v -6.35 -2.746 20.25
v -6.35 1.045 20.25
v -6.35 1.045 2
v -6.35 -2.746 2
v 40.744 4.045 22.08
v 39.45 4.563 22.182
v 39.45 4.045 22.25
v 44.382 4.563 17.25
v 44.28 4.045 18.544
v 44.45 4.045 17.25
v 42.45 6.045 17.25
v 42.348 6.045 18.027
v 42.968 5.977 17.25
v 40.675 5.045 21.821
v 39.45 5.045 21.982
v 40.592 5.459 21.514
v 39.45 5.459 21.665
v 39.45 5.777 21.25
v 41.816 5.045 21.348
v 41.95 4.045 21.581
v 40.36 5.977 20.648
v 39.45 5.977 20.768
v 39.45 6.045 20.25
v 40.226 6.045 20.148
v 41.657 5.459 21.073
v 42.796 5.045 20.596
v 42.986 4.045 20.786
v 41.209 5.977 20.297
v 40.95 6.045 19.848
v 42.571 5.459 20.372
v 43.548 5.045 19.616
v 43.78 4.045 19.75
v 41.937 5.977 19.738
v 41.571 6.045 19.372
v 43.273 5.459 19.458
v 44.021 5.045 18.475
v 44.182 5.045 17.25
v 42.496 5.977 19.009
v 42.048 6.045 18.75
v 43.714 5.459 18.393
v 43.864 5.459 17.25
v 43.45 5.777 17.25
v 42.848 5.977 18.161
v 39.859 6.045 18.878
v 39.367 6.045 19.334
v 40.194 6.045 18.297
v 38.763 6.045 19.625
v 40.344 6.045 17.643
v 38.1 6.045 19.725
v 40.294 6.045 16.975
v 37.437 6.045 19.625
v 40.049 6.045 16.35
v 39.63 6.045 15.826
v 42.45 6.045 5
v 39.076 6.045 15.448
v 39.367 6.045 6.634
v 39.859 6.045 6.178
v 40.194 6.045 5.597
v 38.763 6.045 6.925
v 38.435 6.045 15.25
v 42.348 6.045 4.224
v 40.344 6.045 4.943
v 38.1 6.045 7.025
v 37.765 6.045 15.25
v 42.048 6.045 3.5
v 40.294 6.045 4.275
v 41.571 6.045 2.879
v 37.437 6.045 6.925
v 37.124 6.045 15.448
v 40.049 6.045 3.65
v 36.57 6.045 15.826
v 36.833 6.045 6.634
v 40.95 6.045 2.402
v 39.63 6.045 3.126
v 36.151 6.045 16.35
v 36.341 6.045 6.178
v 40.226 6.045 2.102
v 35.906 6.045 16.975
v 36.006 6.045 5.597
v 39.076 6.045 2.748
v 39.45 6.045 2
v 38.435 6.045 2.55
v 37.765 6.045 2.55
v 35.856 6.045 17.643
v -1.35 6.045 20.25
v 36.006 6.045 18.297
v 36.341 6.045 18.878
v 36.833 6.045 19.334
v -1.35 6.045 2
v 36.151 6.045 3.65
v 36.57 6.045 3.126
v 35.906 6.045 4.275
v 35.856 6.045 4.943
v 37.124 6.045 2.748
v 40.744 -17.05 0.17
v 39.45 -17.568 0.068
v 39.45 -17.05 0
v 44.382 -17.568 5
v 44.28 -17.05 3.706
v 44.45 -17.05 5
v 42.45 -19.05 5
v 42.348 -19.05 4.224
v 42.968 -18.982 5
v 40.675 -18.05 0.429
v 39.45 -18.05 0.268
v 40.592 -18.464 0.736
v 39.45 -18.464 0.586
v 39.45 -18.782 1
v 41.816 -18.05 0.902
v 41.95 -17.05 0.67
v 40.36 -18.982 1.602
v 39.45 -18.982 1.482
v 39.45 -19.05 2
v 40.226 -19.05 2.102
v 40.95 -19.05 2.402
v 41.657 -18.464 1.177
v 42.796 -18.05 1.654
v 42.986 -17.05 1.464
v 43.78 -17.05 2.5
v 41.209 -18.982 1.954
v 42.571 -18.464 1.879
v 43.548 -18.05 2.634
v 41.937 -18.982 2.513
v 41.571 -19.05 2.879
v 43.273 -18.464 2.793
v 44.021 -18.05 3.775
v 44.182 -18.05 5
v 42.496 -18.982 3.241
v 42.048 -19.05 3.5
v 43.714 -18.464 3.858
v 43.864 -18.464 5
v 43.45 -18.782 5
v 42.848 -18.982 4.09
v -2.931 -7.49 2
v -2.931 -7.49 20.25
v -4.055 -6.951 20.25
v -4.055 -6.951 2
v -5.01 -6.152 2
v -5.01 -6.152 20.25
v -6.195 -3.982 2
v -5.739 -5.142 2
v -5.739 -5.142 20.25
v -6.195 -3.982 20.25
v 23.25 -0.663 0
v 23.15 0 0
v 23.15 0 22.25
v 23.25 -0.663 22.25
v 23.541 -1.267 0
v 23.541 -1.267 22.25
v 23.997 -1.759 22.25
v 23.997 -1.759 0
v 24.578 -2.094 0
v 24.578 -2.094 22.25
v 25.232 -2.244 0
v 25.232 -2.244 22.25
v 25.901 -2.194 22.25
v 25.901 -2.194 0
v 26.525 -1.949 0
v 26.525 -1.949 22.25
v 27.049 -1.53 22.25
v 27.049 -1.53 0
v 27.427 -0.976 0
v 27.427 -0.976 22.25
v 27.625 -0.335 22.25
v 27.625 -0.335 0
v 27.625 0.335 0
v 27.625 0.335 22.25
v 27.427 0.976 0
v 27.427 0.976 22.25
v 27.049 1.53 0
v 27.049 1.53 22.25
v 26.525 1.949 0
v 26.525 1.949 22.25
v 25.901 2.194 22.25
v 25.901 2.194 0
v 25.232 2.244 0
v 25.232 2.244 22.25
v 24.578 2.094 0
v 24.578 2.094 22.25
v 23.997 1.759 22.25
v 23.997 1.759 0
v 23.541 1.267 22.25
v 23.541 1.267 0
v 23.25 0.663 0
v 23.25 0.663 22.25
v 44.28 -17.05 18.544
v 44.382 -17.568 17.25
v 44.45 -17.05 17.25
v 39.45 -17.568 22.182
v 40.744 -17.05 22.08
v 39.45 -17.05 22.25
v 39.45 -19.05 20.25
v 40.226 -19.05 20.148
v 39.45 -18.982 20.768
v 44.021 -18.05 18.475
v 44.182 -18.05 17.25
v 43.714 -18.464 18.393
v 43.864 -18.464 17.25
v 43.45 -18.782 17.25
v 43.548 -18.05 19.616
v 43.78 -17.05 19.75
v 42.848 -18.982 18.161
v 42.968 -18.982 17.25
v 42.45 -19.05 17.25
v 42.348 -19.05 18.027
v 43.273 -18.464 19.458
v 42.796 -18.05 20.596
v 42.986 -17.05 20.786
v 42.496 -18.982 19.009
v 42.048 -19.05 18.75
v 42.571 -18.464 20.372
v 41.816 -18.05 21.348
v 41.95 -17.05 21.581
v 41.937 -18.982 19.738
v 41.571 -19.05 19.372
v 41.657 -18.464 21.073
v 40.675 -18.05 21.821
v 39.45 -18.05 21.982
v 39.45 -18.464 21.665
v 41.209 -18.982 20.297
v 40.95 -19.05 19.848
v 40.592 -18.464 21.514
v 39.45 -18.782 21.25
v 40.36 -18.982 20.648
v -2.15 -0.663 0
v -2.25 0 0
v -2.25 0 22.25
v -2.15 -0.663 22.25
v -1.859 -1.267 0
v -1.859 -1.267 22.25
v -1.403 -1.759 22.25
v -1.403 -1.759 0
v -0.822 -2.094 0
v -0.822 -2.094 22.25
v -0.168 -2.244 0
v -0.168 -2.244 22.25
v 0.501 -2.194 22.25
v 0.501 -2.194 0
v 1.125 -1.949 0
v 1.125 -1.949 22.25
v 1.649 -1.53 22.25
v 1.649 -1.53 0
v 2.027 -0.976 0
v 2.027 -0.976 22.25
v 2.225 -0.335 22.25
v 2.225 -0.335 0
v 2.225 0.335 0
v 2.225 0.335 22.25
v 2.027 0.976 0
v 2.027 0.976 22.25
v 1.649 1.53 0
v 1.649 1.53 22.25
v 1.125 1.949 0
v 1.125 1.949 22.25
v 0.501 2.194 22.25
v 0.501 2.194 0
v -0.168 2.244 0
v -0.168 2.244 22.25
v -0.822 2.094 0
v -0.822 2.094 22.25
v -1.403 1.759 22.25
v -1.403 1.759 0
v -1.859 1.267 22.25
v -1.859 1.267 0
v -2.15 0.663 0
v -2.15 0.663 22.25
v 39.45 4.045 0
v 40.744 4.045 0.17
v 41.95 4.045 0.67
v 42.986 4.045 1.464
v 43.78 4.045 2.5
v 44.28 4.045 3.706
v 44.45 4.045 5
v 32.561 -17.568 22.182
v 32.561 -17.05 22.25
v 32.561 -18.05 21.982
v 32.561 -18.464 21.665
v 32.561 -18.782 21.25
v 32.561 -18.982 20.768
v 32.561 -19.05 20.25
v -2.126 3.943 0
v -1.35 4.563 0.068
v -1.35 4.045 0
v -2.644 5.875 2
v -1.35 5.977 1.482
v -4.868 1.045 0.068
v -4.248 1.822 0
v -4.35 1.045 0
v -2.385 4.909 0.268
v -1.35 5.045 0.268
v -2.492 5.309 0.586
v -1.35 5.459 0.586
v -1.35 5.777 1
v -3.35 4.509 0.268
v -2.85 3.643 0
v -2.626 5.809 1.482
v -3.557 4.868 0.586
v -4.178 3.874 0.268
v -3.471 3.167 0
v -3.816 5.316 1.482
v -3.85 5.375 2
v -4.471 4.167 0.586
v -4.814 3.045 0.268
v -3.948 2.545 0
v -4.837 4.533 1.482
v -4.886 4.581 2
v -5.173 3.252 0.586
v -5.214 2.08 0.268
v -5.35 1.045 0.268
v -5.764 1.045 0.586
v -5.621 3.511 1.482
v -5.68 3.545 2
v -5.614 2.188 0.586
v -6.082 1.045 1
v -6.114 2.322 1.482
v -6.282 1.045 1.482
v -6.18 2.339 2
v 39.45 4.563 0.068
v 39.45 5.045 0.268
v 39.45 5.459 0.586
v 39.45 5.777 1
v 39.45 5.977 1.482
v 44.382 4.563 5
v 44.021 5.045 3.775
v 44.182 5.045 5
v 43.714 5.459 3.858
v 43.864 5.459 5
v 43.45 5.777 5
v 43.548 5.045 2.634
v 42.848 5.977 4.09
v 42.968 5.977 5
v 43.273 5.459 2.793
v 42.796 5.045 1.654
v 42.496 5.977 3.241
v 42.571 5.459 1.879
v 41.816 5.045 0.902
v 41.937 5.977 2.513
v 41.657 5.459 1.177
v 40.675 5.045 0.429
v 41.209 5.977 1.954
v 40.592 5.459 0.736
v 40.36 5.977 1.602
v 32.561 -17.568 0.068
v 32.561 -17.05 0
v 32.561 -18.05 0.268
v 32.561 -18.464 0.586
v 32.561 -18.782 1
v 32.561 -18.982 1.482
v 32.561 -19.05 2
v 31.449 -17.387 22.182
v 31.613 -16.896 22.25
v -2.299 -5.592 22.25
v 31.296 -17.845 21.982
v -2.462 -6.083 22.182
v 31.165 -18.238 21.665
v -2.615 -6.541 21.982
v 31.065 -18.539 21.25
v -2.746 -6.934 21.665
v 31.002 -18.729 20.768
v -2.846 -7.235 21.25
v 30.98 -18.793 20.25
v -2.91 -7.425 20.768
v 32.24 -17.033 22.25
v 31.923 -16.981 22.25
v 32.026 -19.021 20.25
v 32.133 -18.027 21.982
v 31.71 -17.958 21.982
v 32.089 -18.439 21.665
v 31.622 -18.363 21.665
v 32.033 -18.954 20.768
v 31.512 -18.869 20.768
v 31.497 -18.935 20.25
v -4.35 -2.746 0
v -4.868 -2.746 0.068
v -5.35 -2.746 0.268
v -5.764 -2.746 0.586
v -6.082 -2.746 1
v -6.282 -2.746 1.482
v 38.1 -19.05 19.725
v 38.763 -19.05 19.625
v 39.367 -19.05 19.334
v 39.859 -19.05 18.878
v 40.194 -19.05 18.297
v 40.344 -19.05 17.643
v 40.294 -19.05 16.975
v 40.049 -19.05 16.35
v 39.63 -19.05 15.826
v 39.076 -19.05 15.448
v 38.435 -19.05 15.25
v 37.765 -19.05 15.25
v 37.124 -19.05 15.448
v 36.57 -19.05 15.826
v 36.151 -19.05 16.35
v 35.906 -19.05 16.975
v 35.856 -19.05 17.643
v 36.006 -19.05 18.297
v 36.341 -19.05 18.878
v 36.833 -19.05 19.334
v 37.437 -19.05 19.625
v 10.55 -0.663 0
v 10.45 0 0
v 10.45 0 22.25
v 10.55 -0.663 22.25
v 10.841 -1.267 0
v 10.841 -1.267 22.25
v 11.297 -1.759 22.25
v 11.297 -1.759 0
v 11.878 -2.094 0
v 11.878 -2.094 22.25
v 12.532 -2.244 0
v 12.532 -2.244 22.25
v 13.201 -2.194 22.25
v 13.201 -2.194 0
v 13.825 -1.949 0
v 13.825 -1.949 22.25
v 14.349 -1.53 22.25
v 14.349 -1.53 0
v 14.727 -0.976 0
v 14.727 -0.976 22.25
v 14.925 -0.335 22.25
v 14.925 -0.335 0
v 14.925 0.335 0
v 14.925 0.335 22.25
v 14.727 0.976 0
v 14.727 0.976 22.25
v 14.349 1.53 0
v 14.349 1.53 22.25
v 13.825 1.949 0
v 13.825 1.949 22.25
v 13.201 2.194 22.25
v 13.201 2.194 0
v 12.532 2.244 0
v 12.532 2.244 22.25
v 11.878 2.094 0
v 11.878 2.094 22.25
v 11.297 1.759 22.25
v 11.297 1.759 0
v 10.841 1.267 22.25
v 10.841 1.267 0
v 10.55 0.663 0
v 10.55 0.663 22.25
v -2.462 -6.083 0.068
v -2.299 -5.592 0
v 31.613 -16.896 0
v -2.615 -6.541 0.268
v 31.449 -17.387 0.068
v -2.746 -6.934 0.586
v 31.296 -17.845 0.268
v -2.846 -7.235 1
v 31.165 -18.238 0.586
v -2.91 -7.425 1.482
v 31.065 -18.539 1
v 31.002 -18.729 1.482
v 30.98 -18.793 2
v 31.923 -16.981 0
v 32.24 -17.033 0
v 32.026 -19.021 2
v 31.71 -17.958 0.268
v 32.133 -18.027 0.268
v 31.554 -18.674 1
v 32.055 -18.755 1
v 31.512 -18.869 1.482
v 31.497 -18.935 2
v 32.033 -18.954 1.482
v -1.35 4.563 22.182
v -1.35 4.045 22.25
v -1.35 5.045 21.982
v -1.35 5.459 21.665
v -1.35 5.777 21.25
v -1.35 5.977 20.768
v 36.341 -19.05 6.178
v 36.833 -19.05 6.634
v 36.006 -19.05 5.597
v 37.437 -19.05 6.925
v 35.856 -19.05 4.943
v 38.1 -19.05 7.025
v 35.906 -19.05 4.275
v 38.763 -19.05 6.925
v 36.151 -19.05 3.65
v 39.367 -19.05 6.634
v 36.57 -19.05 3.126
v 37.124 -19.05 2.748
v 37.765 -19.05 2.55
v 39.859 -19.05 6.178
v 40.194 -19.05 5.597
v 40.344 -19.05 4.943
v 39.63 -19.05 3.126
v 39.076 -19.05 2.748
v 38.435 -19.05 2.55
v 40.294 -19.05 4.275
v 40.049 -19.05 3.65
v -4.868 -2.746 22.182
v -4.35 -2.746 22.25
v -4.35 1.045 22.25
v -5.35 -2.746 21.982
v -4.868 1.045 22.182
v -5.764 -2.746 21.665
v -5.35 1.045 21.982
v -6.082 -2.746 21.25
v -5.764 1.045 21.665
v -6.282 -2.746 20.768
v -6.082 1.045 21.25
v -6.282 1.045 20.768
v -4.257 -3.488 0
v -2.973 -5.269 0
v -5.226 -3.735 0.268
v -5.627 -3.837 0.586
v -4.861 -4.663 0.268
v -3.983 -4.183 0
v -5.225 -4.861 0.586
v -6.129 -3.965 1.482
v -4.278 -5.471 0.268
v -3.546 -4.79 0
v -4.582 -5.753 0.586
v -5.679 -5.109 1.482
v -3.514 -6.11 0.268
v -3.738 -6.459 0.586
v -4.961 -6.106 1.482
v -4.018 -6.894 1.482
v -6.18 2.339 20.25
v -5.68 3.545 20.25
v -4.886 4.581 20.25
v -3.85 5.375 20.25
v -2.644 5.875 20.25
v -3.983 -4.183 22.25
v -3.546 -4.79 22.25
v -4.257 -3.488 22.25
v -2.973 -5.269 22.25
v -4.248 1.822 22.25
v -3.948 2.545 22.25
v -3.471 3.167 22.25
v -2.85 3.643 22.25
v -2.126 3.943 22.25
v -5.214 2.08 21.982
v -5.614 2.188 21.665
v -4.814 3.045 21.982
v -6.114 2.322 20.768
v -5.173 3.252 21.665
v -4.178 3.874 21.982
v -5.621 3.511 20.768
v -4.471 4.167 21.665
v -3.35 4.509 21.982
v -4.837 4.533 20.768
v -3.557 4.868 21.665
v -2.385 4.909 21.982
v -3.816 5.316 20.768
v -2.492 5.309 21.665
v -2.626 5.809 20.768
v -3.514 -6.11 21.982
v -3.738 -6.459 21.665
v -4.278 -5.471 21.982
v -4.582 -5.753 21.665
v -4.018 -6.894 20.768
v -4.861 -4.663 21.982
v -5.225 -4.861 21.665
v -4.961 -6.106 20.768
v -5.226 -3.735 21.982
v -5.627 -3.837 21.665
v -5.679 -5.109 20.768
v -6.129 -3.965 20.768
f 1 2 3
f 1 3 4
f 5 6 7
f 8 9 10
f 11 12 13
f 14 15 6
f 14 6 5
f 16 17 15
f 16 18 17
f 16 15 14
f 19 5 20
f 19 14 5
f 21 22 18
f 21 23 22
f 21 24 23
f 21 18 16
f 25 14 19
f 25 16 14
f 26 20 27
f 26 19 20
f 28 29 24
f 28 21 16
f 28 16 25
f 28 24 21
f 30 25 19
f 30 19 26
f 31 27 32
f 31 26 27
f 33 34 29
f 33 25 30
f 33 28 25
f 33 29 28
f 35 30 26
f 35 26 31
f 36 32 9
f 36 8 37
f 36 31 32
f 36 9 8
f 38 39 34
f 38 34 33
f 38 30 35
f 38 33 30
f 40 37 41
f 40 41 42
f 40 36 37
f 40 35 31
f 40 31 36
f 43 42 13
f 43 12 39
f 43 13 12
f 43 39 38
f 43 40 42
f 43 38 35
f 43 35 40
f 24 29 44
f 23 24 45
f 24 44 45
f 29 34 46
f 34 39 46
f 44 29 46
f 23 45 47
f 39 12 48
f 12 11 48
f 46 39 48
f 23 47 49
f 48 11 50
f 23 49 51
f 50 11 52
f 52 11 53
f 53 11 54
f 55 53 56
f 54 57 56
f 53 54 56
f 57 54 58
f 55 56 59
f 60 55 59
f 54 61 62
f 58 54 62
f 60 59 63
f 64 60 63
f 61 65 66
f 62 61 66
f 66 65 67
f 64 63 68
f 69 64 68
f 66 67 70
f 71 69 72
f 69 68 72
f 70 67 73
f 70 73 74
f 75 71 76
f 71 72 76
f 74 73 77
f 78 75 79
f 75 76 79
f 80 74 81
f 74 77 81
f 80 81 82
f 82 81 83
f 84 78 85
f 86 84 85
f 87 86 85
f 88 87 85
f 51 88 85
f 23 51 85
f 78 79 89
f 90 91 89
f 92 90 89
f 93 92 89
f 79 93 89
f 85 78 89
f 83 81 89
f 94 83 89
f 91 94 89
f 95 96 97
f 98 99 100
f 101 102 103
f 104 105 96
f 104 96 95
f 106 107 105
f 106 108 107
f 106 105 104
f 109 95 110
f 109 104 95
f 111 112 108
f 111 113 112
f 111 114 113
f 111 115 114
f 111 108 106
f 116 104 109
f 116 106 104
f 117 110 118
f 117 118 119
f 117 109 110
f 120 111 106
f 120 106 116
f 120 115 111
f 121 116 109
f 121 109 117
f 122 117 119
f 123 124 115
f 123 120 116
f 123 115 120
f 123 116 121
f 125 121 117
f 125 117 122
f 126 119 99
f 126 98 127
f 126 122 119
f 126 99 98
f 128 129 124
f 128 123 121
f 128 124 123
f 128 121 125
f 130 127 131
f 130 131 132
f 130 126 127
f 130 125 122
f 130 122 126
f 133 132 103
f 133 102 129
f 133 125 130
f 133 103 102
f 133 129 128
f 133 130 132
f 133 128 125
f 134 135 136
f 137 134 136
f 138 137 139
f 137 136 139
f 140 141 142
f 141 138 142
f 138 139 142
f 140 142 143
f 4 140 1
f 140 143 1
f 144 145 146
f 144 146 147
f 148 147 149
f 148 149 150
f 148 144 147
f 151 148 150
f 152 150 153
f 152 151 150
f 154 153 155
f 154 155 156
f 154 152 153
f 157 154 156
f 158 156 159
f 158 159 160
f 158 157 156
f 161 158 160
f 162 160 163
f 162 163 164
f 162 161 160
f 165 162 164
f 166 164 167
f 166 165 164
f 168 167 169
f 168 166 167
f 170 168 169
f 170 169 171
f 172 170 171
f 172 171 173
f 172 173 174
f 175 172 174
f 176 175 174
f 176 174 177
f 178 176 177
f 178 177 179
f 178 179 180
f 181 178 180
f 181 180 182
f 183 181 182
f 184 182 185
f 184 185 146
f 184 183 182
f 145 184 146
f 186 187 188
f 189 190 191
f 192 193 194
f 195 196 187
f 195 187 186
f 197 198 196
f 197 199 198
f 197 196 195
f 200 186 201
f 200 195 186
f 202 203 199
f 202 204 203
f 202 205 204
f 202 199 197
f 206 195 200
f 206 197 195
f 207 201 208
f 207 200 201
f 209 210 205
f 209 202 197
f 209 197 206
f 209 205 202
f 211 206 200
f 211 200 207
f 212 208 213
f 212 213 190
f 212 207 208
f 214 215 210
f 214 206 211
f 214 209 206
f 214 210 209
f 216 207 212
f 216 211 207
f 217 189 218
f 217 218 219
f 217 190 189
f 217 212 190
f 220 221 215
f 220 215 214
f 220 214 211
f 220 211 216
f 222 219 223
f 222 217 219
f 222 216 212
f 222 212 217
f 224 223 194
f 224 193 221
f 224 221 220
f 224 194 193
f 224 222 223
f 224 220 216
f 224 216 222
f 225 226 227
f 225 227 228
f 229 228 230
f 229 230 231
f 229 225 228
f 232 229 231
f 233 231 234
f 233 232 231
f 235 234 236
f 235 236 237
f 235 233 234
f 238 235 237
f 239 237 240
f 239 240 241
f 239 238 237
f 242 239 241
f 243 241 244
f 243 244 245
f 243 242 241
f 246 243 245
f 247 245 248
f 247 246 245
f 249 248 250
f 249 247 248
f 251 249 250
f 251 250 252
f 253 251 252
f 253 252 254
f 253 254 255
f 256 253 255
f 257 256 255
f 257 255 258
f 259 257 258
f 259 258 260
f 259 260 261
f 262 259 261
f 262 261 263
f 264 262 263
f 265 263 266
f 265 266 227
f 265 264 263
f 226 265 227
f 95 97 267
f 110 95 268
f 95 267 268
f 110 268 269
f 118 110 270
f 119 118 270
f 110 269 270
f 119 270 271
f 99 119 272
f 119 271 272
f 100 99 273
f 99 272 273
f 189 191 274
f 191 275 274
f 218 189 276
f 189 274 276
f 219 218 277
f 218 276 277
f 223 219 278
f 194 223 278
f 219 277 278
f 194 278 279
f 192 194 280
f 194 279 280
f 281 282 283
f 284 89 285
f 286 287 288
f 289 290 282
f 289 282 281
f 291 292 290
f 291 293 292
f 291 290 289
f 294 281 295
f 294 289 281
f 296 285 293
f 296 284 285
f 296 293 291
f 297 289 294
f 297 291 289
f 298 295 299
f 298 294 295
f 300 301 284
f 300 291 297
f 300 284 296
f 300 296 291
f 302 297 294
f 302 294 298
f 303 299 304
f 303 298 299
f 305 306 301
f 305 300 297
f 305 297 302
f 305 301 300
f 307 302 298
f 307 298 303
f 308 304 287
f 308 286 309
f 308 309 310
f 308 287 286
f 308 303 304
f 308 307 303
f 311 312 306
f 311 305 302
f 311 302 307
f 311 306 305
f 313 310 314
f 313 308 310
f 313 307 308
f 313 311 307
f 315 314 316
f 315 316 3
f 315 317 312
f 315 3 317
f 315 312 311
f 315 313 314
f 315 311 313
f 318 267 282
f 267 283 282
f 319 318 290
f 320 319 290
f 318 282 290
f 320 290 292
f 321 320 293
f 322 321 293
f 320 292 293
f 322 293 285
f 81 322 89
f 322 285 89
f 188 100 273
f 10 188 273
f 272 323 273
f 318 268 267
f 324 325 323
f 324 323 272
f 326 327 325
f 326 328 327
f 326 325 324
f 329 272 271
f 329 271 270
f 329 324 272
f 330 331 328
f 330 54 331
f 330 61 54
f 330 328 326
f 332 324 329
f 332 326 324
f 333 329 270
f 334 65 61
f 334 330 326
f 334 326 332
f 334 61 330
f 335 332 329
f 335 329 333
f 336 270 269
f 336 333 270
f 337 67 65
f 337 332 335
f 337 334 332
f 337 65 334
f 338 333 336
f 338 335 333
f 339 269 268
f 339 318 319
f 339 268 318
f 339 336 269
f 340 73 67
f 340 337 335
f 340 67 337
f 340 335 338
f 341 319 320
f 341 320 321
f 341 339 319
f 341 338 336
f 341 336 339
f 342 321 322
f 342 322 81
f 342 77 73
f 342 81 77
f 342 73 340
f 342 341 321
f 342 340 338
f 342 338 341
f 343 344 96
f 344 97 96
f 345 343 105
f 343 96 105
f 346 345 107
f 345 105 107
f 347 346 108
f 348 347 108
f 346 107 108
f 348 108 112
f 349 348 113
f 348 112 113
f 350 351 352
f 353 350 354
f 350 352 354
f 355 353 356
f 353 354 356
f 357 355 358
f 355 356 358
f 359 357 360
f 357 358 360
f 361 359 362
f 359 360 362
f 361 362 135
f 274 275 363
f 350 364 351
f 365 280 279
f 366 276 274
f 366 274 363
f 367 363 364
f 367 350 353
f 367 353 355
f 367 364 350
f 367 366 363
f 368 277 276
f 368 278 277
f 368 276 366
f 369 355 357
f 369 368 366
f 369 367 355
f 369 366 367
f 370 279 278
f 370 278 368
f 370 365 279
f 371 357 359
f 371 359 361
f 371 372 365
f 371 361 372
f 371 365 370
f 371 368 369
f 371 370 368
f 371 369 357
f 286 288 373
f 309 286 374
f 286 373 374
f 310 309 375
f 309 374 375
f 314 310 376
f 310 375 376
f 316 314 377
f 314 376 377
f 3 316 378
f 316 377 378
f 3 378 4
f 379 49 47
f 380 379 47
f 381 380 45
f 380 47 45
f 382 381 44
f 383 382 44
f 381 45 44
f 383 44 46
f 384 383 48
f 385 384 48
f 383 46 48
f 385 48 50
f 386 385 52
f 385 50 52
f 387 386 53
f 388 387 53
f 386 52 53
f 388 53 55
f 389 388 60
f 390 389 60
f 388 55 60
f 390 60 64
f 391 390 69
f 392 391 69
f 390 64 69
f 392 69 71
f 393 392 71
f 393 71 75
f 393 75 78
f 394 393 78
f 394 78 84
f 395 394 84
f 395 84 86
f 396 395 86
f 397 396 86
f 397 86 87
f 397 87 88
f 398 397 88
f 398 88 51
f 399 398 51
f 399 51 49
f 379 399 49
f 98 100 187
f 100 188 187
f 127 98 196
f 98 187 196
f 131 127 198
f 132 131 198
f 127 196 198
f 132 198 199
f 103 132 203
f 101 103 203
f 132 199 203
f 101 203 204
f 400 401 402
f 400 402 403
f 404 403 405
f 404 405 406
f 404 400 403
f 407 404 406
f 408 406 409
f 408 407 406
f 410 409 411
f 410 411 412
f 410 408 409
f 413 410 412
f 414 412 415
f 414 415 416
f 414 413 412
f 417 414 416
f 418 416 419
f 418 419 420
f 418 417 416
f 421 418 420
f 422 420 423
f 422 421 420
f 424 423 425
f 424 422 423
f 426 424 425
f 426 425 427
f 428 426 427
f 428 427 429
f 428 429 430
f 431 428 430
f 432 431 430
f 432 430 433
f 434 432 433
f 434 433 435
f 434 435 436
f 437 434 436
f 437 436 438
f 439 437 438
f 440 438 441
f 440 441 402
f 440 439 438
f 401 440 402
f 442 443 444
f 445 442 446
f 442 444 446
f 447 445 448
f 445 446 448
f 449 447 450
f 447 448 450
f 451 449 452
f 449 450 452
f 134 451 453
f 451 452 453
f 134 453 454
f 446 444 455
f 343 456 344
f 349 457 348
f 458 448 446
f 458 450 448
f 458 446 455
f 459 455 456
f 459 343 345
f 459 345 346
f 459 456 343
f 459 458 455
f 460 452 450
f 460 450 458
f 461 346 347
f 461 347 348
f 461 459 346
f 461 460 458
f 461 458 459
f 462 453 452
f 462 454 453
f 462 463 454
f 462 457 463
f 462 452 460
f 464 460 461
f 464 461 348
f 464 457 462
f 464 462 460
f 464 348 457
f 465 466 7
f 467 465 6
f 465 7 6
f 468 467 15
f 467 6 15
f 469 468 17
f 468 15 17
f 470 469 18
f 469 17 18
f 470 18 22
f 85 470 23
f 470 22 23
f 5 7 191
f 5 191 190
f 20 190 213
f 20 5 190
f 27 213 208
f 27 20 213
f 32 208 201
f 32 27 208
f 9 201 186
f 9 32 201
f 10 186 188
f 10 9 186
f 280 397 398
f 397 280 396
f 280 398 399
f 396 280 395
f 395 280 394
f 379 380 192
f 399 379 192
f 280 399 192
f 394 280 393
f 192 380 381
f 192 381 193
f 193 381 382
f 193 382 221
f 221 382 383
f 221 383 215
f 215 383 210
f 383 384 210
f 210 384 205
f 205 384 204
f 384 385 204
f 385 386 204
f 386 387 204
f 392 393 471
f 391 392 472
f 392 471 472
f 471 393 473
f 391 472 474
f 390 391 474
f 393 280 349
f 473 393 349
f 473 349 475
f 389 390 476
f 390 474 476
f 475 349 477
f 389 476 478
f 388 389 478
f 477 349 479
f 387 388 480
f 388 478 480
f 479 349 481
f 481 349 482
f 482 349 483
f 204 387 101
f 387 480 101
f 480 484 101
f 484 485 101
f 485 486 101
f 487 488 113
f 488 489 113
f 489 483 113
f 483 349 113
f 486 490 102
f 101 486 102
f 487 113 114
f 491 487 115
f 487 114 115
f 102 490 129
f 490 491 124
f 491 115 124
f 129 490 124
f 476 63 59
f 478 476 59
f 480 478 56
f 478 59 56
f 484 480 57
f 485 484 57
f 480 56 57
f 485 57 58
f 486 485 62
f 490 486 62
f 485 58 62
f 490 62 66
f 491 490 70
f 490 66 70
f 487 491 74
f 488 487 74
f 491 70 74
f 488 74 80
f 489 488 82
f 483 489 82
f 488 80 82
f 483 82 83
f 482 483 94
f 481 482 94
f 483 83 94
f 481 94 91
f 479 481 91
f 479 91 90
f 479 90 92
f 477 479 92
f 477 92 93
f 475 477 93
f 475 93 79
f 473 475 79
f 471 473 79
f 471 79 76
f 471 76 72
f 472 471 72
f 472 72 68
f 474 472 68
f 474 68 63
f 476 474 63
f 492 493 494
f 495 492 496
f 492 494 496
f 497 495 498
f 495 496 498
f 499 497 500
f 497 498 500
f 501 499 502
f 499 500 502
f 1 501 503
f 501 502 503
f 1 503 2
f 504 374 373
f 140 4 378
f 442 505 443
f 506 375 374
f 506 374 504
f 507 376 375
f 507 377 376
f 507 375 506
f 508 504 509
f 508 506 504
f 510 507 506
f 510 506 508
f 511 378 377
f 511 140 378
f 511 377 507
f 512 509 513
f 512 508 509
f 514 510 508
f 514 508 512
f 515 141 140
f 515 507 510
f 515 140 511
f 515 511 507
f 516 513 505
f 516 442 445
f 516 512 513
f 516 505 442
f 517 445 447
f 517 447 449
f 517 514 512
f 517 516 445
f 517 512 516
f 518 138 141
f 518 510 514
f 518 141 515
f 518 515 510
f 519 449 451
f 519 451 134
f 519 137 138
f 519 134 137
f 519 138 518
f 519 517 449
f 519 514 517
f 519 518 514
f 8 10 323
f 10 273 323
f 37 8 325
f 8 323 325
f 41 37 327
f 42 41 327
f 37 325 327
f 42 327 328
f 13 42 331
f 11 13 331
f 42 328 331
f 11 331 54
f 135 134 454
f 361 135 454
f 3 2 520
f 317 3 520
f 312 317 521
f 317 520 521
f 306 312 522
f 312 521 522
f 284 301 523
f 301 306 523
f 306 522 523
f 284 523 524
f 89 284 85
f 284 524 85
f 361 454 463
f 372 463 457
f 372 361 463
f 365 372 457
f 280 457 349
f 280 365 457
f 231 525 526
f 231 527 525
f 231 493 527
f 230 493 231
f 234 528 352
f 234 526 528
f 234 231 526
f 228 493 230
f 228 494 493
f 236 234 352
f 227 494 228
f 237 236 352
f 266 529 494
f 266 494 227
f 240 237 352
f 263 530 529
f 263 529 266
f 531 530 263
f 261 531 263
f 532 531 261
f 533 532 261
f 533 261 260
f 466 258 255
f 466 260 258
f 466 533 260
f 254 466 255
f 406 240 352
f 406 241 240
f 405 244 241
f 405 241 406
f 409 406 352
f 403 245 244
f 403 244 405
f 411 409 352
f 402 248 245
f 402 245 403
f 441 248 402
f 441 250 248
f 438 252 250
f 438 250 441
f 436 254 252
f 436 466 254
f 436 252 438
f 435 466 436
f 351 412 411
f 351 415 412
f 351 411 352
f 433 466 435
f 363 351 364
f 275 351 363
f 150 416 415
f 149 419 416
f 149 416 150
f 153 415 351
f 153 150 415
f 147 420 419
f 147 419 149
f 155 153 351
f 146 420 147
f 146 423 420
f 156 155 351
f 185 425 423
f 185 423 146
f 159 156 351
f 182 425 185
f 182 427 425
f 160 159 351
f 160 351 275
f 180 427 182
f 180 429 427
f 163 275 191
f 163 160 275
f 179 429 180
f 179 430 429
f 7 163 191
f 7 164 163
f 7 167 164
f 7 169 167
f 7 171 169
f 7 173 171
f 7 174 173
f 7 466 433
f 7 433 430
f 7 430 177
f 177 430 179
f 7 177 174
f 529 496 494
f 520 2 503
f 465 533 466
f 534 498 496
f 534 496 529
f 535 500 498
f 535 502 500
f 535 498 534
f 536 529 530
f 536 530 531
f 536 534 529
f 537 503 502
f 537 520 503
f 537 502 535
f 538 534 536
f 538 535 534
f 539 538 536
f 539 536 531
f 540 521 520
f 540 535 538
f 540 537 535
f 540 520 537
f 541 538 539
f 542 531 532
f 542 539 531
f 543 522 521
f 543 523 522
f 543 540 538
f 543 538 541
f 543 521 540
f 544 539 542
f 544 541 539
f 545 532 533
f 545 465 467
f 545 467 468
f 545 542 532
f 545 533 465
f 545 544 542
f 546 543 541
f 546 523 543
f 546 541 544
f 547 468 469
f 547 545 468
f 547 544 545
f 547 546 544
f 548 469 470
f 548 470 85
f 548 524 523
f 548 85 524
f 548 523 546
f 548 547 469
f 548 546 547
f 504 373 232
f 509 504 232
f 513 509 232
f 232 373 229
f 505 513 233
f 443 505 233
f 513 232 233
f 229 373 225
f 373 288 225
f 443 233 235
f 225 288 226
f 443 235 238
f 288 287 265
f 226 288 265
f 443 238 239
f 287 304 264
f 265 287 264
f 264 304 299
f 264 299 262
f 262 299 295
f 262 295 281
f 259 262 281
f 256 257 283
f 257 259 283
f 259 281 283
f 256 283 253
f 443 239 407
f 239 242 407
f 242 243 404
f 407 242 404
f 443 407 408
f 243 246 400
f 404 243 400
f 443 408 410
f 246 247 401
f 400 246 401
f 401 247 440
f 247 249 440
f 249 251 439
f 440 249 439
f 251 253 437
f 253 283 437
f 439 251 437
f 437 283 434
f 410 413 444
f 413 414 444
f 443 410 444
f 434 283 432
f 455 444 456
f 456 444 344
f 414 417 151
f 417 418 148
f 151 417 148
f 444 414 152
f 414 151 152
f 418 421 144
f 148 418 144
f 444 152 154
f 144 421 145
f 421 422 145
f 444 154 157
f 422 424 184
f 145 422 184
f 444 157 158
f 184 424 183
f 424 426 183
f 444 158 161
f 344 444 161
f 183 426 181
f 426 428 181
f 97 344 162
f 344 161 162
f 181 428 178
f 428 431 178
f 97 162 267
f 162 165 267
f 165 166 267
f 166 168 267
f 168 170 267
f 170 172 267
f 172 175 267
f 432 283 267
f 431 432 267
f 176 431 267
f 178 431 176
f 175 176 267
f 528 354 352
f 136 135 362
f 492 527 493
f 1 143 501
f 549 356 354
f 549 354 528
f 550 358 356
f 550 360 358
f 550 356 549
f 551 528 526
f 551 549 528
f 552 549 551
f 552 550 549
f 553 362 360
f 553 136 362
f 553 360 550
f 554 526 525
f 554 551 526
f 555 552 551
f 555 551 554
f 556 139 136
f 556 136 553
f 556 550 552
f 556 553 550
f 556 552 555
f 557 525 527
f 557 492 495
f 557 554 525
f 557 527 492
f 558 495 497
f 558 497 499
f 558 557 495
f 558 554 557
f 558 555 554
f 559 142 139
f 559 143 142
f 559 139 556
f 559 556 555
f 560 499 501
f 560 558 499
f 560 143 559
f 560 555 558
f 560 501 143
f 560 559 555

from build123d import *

# Parameters (mm, degrees)
SKETCH1_R           = 2.25
BOSS_EXTRUDE1_DEPTH = 22.2504
CUT_EXTRUDE1_REACH  = 57.683
SKETCH2_R           = 2.25
FILLET1_R           = 5
FILLET2_R           = 2


with BuildPart() as part:
    # Sketch1 → Boss-Extrude1 (new body)
    with BuildSketch(Plane.XY):
        Polygon((-6.35, -6.35), (31.75, -19.05), (44.45, -19.05), (44.45, 6.0452), (-6.35, 6.0452), align=None)
        with Locations(Location((0, 0, 0), (0, 0, 180))):
            Circle(SKETCH1_R, mode=Mode.SUBTRACT)
        with Locations(Location((12.7, 0, 0), (0, 0, 180))):
            Circle(SKETCH1_R, mode=Mode.SUBTRACT)
        with Locations(Location((25.4, 0, 0), (0, 0, 180))):
            Circle(SKETCH1_R, mode=Mode.SUBTRACT)
    extrude(amount=BOSS_EXTRUDE1_DEPTH)

    # Sketch2 → Cut-Extrude1 (cut, up to next)
    with BuildSketch(Plane(origin=(0, 6.0452, 0), x_dir=(1, 0, 0), z_dir=(0, 1, 0)), mode=Mode.PRIVATE) as cut_extrude1_sk1:
        with Locations(Location((38.1, -17.4752, 0), (0, 0, 270))):
            Circle(SKETCH2_R)
    cut_extrude1_tool1 = extrude(cut_extrude1_sk1.sketch, amount=-CUT_EXTRUDE1_REACH, mode=Mode.PRIVATE) & part.part
    # Sketch2 → Cut-Extrude1 (cut, up to next)
    with BuildSketch(Plane(origin=(0, 6.0452, 0), x_dir=(1, 0, 0), z_dir=(0, 1, 0)), mode=Mode.PRIVATE) as cut_extrude1_sk2:
        with Locations(Location((38.1, -4.7752, 0), (0, 0, 270))):
            Circle(SKETCH2_R)
    cut_extrude1_tool2 = extrude(cut_extrude1_sk2.sketch, amount=-CUT_EXTRUDE1_REACH, mode=Mode.PRIVATE) & part.part
    add(cut_extrude1_tool1.solids().sort_by_distance((38.1, 6.0452, 17.4752))[0], mode=Mode.SUBTRACT)
    add(cut_extrude1_tool2.solids().sort_by_distance((38.1, 6.0452, 4.7752))[0], mode=Mode.SUBTRACT)

    # Fillet1
    fillet1_edges = [part.edges().sort_by_distance(p)[0] for p in [
        (44.45, -6.5024, 0),
        (44.45, -6.5024, 22.2504),
        (31.75, -19.05, 11.1252),
        (-6.35, -6.35, 11.1252),
        (-6.35, 6.0452, 11.1252),
    ]]
    fillet(fillet1_edges, radius=FILLET1_R)

    # Fillet2
    fillet2_edges = [part.edges().sort_by_distance(p)[0] for p in [
        (36.00569415, -19.05, 0),
        (44.45, -19.05, 11.1252),
        (36.00569415, -19.05, 22.2504),
        (42.985533906, -19.05, 20.785933906),
        (42.985533906, -19.05, 1.464466094),
        (14.02455532, -13.14151844, 0),
        (-6.35, -0.85050195, 0),
        (19.05, 6.0452, 0),
        (-4.885533906, 4.580733906, 0),
        (-5.406210926, -5.669755323, 0),
        (31.760477086, -18.985437288, 0),
        (14.02455532, -13.14151844, 22.2504),
        (19.05, 6.0452, 22.2504),
        (-6.35, -0.85050195, 22.2504),
        (-4.885533906, 4.580733906, 22.2504),
        (-5.406210926, -5.669755323, 22.2504),
        (31.760477086, -18.985437288, 22.2504),
        (44.45, 6.0452, 11.1252),
        (42.985533906, 6.0452, 20.785933906),
        (42.985533906, 6.0452, 1.464466094),
    ]]
    fillet(fillet2_edges, radius=FILLET2_R)


solid = part.part
